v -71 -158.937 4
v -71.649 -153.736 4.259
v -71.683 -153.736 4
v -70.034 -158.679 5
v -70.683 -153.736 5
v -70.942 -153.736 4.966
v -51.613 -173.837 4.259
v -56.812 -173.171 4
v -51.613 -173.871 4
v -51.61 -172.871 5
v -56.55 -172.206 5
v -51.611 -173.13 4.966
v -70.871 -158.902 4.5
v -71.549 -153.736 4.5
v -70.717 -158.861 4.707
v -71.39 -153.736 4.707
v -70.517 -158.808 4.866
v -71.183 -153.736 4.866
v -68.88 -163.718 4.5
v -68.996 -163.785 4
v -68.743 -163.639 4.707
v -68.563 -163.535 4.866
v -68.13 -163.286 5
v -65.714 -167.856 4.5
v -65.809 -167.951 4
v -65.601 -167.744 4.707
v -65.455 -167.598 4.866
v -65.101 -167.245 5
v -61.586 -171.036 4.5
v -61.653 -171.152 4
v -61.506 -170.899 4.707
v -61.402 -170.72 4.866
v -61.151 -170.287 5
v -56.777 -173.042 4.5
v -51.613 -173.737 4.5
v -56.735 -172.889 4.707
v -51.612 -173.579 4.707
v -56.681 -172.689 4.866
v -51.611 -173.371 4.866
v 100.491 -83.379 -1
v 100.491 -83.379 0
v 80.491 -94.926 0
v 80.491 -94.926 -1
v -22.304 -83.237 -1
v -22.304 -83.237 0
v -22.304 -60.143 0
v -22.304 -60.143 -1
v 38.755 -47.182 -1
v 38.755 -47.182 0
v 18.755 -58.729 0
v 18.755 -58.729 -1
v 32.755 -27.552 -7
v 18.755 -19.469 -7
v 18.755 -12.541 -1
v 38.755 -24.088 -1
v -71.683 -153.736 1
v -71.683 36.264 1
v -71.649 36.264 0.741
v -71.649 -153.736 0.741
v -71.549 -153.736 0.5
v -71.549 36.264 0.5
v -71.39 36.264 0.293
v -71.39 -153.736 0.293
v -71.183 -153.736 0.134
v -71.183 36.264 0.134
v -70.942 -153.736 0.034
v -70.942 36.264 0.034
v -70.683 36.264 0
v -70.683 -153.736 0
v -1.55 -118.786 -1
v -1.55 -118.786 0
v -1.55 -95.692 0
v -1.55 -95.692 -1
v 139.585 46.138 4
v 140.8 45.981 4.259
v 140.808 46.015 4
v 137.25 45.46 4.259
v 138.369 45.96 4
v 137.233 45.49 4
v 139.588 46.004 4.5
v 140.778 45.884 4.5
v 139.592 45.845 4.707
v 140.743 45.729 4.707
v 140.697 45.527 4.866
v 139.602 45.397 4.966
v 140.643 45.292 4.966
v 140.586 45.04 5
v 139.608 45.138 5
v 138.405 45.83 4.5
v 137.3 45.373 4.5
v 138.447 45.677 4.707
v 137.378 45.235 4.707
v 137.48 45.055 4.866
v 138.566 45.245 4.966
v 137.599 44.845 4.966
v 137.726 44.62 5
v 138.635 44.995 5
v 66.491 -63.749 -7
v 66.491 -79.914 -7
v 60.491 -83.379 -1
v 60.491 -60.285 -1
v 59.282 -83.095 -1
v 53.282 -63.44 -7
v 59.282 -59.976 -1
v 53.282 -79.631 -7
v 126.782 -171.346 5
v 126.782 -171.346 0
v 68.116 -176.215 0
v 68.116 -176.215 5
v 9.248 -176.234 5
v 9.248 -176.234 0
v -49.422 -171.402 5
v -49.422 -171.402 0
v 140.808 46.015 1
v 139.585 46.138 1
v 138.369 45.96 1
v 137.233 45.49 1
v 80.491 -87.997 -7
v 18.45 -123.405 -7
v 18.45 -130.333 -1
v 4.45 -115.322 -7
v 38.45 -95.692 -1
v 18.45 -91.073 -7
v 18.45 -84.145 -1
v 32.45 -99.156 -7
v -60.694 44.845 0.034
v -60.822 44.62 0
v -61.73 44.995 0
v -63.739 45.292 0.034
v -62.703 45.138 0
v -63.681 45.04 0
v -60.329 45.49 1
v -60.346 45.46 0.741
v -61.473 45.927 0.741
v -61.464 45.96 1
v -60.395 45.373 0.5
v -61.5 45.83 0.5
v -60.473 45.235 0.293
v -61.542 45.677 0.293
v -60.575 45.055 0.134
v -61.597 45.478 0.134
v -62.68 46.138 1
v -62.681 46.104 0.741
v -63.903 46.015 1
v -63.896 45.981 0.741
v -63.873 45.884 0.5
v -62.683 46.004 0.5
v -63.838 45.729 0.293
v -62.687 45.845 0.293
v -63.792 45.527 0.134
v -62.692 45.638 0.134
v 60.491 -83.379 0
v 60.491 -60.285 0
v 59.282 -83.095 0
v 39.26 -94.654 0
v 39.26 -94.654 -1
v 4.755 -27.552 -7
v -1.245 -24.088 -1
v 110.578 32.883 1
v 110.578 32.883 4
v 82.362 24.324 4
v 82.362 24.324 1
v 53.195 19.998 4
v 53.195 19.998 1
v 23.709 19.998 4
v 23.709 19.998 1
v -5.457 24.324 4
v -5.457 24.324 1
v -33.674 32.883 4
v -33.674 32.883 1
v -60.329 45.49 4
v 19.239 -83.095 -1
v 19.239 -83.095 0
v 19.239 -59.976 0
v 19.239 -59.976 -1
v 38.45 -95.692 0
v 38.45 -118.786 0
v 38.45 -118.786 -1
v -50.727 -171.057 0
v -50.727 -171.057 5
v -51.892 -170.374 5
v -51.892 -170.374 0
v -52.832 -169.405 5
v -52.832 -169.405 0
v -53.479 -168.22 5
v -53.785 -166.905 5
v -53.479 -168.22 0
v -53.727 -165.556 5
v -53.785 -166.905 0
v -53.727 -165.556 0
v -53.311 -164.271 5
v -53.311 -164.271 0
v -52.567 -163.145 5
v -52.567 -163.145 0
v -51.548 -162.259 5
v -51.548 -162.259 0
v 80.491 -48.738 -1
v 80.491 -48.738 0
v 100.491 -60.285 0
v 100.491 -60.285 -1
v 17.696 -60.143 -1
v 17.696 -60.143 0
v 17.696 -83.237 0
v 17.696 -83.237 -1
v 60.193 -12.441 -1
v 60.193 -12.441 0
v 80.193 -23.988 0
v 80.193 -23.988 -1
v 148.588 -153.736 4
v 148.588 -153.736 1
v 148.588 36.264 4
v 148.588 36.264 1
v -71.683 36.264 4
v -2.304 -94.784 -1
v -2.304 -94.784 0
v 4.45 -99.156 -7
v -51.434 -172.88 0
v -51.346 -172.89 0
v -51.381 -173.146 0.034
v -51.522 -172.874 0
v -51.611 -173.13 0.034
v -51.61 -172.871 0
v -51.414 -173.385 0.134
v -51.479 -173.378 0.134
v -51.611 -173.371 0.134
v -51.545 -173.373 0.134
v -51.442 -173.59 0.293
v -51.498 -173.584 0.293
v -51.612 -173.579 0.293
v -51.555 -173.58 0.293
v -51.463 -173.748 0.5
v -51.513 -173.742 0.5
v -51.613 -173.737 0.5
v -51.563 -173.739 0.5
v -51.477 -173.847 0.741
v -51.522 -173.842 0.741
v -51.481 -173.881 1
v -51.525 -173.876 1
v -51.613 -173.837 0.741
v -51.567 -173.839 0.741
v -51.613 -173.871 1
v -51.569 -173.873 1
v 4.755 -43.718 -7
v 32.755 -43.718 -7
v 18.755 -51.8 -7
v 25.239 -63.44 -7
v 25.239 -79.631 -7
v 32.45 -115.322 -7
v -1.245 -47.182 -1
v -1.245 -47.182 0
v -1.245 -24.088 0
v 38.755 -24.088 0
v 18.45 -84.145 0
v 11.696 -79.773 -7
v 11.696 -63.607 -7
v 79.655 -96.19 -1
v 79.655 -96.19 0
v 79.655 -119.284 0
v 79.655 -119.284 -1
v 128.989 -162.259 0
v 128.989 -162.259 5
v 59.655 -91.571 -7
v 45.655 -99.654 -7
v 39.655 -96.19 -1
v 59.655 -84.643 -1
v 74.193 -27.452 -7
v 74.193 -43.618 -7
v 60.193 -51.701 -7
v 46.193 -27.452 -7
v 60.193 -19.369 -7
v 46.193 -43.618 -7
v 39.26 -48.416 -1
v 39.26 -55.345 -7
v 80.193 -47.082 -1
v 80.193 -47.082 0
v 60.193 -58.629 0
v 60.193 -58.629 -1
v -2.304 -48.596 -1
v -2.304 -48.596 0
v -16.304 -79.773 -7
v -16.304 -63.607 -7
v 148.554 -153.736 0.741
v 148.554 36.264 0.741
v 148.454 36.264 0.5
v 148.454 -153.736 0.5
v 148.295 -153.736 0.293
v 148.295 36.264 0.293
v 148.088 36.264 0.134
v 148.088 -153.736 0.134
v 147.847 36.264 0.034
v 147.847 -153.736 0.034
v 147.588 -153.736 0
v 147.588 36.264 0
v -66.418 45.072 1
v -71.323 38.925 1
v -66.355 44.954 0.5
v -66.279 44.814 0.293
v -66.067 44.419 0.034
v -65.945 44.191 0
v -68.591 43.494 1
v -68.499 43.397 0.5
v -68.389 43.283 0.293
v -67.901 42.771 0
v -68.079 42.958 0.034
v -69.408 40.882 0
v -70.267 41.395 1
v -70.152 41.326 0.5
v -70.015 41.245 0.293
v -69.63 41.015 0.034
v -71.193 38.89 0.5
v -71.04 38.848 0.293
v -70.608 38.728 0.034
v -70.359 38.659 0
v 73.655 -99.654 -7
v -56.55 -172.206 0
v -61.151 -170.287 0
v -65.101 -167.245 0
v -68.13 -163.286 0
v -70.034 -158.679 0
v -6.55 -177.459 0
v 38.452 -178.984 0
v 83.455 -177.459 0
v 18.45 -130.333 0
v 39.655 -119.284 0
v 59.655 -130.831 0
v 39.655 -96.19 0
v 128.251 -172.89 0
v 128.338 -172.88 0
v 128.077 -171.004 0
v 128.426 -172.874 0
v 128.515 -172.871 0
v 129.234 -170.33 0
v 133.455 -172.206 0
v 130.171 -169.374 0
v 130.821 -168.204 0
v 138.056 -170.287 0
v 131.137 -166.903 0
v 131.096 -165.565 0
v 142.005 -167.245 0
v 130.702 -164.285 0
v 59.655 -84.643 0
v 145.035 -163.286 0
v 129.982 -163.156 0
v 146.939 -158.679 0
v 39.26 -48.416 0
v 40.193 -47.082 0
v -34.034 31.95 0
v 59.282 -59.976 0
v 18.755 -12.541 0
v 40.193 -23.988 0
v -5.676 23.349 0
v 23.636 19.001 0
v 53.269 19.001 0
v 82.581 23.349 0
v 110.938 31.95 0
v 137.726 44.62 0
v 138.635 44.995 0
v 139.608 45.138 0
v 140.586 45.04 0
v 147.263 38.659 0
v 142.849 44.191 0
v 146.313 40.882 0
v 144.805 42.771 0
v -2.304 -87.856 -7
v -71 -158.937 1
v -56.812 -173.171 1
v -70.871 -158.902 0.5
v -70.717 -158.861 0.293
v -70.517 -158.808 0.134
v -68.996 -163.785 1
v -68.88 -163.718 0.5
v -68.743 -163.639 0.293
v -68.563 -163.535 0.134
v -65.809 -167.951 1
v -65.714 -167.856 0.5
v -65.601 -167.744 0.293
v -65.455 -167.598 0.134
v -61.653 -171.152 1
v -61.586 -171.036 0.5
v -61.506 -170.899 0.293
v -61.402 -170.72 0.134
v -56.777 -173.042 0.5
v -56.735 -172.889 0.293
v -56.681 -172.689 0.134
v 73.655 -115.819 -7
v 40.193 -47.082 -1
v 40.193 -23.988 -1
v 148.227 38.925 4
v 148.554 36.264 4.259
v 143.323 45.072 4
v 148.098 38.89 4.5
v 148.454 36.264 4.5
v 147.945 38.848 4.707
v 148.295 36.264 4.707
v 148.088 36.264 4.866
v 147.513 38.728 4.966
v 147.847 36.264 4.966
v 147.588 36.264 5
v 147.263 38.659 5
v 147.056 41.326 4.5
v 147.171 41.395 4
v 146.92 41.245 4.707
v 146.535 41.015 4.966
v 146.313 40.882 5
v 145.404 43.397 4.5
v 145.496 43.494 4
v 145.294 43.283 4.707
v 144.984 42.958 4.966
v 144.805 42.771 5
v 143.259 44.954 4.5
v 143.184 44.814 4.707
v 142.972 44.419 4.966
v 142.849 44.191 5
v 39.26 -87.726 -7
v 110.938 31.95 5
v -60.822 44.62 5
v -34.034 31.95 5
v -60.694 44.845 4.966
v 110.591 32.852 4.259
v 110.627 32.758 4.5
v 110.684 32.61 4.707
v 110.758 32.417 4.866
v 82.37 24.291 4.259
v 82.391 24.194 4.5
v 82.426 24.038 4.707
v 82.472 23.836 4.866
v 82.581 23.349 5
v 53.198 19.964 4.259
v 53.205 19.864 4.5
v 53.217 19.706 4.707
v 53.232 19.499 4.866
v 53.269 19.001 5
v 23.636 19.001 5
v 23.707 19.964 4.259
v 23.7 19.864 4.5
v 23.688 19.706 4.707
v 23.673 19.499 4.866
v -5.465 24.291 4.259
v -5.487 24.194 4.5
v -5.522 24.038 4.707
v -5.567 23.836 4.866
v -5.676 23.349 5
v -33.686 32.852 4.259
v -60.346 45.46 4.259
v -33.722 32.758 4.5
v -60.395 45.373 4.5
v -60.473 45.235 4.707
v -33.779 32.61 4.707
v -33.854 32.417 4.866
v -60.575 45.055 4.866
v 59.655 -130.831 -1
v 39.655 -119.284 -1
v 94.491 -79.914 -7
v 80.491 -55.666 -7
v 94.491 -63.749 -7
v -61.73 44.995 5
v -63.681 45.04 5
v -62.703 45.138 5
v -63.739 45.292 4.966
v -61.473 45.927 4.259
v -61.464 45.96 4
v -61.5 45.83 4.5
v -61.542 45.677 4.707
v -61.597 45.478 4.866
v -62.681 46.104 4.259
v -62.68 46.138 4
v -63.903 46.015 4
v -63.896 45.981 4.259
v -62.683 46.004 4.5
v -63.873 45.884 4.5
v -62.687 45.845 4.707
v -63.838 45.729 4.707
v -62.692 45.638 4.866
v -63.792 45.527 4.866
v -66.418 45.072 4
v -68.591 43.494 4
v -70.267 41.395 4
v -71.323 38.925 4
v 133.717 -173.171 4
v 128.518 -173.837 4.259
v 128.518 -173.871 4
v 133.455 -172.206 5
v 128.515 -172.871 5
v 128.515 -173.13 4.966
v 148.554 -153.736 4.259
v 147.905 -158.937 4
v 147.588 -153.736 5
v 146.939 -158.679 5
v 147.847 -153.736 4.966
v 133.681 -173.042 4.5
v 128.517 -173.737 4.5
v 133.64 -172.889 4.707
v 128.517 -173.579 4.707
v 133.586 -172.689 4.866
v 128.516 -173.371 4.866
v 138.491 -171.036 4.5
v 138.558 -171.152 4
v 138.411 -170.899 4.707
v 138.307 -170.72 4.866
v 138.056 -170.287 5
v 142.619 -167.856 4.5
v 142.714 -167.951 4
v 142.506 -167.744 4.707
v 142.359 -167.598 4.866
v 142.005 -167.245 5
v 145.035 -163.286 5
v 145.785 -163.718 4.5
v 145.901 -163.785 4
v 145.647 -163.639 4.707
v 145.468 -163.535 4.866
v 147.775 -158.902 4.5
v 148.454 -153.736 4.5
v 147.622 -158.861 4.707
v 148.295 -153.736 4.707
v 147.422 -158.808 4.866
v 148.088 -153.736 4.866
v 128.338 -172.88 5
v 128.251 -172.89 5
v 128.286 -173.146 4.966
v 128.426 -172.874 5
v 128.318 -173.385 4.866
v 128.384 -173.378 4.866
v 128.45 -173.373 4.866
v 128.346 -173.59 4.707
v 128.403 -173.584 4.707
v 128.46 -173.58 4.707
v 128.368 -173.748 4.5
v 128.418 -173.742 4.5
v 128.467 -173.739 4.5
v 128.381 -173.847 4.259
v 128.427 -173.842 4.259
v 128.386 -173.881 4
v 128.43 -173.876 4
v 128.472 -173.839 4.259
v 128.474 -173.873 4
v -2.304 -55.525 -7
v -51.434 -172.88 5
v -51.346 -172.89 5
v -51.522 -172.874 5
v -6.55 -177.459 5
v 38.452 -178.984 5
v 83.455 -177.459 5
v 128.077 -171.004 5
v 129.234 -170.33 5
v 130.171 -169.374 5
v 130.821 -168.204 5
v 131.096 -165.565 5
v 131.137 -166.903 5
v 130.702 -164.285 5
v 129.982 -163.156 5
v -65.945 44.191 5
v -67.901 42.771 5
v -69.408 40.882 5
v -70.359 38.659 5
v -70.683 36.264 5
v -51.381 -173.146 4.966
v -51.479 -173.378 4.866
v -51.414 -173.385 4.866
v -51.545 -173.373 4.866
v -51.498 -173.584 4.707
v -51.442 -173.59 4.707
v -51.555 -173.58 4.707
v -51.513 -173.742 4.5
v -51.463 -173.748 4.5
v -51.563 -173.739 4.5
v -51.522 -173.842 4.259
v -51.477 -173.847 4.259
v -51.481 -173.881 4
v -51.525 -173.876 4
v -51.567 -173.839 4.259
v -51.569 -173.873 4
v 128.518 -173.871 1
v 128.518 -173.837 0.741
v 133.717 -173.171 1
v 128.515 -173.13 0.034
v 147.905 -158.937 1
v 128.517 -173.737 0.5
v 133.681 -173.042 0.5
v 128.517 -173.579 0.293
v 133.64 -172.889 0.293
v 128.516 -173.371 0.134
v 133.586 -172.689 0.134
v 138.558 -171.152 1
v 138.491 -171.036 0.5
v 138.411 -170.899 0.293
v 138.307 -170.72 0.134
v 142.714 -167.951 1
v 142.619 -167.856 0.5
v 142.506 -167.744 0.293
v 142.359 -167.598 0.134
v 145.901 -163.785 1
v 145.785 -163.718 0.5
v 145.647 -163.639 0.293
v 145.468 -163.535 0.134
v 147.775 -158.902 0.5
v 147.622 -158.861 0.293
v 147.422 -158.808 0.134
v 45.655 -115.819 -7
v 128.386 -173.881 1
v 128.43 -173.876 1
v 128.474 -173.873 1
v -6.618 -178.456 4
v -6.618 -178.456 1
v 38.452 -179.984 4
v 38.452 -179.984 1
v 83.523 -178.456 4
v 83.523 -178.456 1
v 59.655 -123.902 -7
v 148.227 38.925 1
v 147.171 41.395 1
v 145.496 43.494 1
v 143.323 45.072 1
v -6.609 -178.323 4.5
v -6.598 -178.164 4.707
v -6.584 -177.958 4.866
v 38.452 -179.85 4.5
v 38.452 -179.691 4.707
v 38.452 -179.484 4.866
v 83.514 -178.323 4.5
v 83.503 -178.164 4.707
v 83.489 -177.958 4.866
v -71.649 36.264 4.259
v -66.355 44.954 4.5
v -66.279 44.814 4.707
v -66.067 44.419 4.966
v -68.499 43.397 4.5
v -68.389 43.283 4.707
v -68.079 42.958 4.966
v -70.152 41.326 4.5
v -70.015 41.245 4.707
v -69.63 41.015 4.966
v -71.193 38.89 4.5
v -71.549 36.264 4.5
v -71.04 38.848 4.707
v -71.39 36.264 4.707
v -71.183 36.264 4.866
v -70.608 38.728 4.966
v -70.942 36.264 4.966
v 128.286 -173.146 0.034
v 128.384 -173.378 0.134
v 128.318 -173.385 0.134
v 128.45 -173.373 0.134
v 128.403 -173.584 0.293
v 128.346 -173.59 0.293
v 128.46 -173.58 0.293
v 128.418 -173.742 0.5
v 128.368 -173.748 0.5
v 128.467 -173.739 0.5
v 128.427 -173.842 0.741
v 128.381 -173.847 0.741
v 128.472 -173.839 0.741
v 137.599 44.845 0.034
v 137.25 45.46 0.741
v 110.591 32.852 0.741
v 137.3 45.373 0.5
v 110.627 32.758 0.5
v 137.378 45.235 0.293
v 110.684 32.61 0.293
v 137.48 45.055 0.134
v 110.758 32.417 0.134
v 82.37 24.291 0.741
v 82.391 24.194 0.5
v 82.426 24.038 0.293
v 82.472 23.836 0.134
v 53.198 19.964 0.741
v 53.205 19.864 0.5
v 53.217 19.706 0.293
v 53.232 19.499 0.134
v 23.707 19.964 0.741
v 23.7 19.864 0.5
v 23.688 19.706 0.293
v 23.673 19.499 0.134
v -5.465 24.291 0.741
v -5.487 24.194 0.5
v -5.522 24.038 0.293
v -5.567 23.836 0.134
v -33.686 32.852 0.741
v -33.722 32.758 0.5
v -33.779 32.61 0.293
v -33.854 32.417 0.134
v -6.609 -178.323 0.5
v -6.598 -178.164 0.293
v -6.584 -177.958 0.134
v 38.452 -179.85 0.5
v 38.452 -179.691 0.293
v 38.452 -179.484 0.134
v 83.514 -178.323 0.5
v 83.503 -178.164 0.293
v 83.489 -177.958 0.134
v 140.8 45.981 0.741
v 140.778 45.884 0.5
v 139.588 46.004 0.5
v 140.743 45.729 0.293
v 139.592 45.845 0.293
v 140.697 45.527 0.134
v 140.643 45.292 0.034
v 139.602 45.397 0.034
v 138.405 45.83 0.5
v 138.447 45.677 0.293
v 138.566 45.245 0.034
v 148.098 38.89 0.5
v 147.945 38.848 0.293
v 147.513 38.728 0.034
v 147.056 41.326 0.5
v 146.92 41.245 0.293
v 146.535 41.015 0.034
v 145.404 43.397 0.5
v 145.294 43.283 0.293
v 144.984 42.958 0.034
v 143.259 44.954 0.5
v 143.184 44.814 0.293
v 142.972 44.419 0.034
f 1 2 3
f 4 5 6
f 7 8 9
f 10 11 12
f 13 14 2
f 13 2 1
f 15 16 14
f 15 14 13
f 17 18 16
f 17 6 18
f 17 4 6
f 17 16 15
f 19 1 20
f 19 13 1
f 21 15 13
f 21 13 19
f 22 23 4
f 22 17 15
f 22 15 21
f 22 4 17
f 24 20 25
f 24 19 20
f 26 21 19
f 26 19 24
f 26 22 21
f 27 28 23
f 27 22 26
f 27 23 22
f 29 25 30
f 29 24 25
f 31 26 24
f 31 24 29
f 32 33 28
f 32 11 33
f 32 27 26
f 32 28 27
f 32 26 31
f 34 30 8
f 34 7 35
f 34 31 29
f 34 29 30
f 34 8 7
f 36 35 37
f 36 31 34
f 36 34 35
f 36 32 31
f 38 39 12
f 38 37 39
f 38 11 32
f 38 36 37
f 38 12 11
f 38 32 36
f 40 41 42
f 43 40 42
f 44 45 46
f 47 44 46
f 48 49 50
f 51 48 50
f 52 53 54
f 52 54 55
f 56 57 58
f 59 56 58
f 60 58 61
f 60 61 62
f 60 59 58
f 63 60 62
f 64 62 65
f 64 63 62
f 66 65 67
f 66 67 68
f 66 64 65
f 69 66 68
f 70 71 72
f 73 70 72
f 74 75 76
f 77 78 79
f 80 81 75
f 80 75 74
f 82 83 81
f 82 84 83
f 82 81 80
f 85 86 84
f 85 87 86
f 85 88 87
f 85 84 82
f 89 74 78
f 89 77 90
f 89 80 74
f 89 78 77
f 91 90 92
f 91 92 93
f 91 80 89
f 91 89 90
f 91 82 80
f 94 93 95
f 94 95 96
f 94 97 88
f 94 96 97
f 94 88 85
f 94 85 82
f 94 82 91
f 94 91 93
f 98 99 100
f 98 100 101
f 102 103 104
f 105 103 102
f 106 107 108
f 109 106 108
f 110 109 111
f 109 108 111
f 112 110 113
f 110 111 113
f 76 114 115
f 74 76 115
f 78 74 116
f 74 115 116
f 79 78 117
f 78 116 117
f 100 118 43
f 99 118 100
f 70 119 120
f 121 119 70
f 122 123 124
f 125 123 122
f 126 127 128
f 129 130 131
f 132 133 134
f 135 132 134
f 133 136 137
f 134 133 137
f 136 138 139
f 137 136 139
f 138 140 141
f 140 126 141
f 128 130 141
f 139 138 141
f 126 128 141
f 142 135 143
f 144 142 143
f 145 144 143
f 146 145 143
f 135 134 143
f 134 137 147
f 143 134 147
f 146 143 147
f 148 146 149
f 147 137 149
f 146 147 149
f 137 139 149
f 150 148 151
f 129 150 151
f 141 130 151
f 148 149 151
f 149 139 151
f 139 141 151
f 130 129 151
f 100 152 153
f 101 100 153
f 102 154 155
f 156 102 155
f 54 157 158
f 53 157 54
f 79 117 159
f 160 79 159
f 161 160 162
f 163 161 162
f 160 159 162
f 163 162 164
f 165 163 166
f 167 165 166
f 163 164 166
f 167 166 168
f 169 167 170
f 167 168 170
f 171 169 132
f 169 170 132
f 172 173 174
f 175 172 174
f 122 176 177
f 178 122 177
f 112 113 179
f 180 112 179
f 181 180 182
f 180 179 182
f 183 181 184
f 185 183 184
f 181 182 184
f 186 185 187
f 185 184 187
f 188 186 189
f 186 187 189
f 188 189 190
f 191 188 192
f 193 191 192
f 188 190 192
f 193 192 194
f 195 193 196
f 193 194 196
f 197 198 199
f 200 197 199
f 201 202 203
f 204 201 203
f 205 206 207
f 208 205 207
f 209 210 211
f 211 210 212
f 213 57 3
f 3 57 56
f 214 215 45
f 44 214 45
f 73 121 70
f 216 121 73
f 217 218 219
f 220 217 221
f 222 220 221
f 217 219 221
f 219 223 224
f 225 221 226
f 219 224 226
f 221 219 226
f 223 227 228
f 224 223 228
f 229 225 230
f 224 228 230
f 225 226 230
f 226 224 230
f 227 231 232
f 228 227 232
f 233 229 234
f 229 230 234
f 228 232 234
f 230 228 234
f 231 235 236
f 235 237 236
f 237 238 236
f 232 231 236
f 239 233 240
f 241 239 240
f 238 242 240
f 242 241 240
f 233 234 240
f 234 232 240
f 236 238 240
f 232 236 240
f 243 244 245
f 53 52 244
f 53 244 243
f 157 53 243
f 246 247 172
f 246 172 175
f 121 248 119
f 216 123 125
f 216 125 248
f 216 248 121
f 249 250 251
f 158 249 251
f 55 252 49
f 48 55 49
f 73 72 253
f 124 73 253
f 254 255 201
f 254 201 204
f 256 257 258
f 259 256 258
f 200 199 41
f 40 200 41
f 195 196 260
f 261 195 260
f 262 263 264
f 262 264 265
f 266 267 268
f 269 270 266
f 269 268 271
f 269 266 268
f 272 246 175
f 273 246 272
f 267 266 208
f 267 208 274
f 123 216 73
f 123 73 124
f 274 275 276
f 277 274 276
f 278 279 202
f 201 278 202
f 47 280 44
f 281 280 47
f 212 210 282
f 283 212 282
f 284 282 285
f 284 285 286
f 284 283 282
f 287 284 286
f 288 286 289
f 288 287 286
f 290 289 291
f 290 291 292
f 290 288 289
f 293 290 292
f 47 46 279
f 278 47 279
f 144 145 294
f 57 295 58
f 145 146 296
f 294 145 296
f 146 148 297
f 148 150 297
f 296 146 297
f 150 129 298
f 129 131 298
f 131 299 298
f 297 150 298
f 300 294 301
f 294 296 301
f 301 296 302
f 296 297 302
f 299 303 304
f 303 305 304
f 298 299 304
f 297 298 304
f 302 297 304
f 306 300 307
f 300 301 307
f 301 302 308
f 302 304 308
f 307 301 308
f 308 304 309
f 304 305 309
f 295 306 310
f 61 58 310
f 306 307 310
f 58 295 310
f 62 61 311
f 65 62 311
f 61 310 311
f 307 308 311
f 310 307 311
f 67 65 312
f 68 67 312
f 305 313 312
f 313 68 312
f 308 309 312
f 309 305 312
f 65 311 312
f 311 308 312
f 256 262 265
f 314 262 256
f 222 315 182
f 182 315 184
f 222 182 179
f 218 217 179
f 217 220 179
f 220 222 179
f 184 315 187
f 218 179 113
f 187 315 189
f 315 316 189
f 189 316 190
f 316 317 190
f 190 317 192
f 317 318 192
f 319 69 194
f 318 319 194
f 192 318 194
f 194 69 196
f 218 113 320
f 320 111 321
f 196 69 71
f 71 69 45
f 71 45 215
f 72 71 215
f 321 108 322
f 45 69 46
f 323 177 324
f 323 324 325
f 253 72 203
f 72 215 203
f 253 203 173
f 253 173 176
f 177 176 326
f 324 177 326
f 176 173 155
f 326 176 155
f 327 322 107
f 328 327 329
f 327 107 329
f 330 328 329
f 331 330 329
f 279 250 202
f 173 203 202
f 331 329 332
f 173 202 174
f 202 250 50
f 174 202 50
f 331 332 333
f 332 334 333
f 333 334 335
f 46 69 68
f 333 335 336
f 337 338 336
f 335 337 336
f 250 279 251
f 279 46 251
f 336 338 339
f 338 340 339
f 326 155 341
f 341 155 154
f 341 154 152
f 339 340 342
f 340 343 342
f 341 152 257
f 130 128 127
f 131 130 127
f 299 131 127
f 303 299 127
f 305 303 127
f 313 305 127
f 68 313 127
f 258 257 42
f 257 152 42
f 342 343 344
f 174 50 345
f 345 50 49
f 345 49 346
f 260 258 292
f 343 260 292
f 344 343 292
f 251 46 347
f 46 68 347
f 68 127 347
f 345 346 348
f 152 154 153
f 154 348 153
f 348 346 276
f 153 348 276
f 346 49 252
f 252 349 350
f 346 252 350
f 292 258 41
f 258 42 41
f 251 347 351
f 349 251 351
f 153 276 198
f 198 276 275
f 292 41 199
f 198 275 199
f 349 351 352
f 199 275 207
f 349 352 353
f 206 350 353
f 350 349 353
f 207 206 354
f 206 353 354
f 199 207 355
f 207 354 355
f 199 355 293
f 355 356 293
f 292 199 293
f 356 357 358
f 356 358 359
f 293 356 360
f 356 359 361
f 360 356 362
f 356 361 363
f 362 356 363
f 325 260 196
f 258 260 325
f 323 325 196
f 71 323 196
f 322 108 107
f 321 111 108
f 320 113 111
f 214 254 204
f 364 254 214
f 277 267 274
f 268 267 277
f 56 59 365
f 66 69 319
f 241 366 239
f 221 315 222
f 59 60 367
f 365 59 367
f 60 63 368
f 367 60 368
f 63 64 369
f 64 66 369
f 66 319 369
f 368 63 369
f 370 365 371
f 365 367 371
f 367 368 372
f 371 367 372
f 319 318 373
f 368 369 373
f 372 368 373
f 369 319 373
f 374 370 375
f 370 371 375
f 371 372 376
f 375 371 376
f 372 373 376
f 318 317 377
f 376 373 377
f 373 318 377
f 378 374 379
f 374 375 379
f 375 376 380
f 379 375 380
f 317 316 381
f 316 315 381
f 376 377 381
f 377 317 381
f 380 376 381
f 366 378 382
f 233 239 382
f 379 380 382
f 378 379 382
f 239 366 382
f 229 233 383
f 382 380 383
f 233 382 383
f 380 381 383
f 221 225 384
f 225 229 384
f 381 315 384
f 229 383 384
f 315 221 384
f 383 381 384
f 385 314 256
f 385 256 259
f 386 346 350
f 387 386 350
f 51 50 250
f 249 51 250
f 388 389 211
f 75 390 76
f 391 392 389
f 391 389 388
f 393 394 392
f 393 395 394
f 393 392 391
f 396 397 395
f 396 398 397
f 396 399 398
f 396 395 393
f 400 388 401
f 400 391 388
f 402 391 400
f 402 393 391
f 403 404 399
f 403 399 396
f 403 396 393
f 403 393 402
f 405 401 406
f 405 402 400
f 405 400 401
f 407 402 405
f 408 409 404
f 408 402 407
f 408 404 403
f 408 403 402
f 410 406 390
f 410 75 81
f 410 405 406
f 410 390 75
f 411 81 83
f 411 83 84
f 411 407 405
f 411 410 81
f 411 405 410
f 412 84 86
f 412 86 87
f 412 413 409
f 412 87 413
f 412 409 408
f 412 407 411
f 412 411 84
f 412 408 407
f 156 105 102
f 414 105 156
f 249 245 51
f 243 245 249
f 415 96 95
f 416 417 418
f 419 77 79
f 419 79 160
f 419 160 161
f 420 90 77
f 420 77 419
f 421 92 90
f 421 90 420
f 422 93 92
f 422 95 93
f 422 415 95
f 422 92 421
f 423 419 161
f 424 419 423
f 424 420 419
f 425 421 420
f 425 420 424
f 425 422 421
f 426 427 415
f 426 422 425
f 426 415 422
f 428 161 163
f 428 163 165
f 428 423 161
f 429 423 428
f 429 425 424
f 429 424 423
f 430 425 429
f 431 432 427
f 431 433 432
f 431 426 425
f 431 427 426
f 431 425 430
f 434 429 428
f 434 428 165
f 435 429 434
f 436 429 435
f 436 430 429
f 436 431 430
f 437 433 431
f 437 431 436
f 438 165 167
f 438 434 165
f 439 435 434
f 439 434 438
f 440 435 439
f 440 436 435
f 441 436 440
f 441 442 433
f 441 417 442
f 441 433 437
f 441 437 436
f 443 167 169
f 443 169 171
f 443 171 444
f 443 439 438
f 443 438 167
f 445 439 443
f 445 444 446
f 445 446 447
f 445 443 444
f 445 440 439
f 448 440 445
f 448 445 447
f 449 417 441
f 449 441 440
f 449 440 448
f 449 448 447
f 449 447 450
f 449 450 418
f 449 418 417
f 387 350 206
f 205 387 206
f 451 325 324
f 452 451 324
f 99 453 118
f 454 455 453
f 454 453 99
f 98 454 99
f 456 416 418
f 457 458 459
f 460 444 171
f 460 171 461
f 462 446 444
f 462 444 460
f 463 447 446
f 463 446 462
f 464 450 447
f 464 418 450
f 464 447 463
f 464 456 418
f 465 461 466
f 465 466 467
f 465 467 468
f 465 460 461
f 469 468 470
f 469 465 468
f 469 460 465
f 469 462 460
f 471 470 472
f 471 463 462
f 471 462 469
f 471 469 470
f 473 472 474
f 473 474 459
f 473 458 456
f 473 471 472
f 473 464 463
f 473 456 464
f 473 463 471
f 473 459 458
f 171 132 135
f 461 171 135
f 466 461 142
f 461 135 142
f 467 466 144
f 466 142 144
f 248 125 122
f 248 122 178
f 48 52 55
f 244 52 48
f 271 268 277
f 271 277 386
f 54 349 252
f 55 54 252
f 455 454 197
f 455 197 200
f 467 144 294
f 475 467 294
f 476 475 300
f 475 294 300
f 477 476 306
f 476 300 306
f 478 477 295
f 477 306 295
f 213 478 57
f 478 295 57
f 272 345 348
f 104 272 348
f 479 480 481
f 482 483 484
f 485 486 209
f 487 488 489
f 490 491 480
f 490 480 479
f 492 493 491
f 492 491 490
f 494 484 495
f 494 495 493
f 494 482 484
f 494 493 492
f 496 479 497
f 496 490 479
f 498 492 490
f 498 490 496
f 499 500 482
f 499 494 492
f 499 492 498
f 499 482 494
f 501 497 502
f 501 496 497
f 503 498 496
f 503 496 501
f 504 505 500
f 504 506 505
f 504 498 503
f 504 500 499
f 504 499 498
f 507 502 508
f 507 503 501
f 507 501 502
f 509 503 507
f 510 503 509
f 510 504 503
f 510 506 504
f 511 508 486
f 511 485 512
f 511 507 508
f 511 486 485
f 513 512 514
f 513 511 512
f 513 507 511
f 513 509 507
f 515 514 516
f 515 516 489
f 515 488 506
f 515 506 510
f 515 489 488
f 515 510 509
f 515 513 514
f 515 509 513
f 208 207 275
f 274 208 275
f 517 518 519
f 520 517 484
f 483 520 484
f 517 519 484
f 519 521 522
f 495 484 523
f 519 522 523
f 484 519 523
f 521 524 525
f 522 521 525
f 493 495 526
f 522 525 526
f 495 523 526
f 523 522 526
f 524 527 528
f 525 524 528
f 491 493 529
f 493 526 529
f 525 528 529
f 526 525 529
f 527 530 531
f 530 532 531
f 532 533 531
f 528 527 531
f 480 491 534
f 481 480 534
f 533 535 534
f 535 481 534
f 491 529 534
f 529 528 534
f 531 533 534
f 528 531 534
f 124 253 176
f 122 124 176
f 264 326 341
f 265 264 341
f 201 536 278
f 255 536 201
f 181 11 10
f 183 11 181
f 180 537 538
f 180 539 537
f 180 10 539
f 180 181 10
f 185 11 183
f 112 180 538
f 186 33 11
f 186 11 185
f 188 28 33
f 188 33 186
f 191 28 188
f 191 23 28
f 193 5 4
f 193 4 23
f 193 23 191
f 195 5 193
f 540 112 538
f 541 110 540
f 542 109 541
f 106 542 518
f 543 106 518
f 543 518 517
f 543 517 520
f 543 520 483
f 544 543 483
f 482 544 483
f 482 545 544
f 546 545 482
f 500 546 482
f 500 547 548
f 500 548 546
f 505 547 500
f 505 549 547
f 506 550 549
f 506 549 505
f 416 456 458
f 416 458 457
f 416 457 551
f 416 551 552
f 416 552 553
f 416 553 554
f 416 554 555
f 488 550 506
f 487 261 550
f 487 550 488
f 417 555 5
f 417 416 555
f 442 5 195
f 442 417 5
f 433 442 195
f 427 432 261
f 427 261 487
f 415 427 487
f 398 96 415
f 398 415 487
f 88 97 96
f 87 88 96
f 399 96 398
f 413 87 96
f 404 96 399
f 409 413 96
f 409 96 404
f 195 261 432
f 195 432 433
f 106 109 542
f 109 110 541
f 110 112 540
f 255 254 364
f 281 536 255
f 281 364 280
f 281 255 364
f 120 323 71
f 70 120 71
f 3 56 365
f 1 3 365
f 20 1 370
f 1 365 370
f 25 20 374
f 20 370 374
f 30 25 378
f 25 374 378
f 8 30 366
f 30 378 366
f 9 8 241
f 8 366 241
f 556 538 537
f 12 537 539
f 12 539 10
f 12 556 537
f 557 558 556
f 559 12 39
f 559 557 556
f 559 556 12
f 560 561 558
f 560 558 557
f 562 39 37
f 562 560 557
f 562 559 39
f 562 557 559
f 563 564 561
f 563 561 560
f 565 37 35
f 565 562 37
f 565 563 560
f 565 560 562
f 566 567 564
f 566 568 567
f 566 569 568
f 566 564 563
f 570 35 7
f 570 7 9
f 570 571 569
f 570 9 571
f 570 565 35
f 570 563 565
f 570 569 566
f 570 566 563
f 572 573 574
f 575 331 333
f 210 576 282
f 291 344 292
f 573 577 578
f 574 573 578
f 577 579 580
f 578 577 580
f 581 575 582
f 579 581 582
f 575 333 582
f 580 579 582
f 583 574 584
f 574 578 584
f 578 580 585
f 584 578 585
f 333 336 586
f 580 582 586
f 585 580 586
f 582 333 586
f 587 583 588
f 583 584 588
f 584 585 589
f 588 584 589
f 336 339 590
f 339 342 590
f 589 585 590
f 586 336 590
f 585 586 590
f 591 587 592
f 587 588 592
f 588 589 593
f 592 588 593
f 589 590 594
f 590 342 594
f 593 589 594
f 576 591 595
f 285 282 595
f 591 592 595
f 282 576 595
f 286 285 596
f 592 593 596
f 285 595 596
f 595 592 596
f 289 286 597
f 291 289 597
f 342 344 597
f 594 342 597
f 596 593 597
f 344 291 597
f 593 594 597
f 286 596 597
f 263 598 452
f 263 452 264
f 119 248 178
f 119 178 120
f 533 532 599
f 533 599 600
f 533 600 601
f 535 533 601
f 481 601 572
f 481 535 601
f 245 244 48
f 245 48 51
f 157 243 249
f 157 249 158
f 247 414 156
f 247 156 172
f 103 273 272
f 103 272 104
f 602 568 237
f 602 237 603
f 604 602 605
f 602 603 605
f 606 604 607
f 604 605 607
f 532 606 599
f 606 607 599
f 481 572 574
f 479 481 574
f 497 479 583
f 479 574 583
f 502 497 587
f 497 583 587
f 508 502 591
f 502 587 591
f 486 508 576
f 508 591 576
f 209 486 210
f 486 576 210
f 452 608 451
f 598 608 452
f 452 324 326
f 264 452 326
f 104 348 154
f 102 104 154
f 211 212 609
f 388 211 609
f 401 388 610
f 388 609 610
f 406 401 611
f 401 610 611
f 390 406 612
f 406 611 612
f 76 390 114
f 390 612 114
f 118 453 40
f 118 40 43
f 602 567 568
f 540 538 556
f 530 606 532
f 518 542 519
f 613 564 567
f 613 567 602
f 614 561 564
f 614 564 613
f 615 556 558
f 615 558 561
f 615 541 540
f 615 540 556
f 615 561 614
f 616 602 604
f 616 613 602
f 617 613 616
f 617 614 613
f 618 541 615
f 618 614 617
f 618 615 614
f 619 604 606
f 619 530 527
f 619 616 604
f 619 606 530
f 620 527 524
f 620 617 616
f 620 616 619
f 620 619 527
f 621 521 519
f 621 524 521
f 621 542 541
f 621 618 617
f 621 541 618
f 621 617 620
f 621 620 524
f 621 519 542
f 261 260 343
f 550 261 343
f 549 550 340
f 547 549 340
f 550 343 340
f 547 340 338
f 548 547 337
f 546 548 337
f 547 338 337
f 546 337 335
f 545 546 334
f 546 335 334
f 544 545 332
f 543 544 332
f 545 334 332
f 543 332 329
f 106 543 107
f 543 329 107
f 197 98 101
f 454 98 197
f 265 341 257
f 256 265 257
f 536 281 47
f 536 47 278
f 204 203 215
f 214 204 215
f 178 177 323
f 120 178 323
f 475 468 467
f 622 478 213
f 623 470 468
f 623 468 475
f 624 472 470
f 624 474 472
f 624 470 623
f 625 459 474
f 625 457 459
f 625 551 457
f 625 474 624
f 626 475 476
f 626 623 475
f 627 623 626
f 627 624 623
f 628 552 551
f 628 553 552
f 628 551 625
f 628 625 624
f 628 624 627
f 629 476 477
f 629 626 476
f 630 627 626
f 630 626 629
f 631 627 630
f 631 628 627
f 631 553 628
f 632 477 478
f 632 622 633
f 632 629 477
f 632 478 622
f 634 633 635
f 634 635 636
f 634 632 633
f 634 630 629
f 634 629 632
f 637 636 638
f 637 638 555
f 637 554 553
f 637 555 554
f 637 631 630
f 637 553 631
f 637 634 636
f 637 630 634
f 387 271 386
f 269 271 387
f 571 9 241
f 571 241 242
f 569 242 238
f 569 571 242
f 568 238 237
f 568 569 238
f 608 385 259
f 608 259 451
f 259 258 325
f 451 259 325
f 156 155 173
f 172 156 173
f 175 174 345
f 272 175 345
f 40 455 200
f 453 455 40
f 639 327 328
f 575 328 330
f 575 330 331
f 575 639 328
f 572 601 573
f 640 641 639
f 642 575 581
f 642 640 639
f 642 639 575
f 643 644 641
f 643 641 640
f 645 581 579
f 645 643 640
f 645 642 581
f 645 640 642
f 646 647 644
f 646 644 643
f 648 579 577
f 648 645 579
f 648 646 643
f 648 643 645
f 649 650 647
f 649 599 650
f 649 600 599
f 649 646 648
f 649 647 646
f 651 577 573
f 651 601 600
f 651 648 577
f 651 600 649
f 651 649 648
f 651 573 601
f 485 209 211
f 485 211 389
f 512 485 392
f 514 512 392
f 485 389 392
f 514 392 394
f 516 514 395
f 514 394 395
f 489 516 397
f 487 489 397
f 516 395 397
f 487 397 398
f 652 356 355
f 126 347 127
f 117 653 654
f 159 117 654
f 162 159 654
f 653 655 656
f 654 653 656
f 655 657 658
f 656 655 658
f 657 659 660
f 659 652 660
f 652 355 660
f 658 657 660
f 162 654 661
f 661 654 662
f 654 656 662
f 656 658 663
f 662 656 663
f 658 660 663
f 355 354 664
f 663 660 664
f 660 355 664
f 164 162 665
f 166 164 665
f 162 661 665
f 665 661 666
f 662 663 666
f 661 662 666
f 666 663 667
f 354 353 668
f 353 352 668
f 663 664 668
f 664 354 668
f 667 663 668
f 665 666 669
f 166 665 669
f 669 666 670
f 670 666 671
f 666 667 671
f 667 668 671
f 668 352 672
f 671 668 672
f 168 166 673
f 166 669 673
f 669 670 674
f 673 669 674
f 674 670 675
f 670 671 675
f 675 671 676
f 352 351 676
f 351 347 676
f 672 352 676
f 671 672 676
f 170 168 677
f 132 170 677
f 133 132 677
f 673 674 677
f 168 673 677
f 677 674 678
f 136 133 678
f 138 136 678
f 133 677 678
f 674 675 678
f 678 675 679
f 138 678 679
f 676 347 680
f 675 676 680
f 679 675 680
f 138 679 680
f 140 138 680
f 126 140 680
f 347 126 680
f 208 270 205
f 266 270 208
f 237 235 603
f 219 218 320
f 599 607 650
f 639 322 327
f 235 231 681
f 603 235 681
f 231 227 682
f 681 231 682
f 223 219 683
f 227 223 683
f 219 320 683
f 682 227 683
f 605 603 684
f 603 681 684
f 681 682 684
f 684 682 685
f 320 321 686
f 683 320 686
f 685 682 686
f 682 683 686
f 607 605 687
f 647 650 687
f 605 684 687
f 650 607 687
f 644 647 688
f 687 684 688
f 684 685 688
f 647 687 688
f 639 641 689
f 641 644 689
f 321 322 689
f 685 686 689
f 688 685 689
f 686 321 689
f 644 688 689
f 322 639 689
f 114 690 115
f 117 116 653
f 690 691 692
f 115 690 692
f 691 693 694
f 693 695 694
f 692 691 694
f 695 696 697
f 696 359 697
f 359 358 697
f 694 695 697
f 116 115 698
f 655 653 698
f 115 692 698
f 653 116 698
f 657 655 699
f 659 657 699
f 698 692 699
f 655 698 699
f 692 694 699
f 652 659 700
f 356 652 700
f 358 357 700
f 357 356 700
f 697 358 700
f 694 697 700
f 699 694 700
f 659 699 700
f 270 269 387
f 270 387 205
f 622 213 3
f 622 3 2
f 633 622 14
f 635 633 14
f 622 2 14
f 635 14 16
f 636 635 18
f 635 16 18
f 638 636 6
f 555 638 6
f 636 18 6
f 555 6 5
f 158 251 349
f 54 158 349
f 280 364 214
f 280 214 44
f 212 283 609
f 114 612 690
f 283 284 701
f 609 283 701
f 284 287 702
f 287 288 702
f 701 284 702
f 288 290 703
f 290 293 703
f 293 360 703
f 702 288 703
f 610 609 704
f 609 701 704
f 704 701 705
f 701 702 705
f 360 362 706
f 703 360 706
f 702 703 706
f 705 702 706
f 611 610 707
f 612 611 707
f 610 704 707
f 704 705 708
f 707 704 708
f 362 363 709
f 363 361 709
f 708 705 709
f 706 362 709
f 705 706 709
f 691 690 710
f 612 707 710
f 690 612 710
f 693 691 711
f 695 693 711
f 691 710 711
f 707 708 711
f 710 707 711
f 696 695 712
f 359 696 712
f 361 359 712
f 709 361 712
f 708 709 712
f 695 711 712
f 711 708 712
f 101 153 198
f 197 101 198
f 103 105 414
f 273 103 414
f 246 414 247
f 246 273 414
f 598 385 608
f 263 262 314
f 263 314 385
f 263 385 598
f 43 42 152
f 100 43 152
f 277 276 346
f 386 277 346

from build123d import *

# Parameters (mm, degrees)
BOSS_EXTRUDE1_DEPTH  = 5
FILLET1_R            = 1
BOSS_EXTRUDE17_DEPTH = 7
CHAMFER1_SIZE        = 6
CHAMFER2_SIZE        = 6
CHAMFER3_SIZE        = 6


with BuildPart() as part:
    # Sketch2 → Boss-Extrude1 (new body)
    with BuildSketch(Plane.XY):
        with BuildLine():
            Line((-71.683238322, 36.264064839), (-71.683238322, -153.735935161))
            ThreePointArc((-71.683238322, -153.735935161), (-65.785654561, -167.973961861), (-51.547627861, -173.871545622))
            ThreePointArc((-51.547627861, -173.871545622), (38.452372139, -179.984063939), (128.452372139, -173.871545622))
            ThreePointArc((128.452372139, -173.871545622), (142.690398839, -167.973961861), (148.5879826, -153.735935161))
            Line((148.5879826, -153.735935161), (148.5879826, 36.264064839))
            ThreePointArc((148.5879826, 36.264064839), (146.404575746, 42.501121163), (140.807808283, 46.014571182))
            ThreePointArc((140.807808283, 46.014571182), (138.971586139, 46.086284232), (137.233469629, 45.489789872))
            ThreePointArc((137.233469629, 45.489789872), (38.452372139, 19.454880614), (-60.328725351, 45.489789872))
            ThreePointArc((-60.328725351, 45.489789872), (-62.066841861, 46.086284232), (-63.903064005, 46.014571182))
            ThreePointArc((-63.903064005, 46.014571182), (-69.499831468, 42.501121163), (-71.683238322, 36.264064839))
        make_face()
        with BuildLine():
            Line((-51.547627861, -162.258832658), (128.989007395, -162.258832658))
            ThreePointArc((128.989007395, -162.258832658), (131.022308029, -167.563941455), (126.782256855, -171.345535941))
            ThreePointArc((126.782256855, -171.345535941), (38.682041526, -176.831727196), (-49.421685934, -171.402229683))
            ThreePointArc((-49.421685934, -171.402229683), (-53.676249609, -167.572612121), (-51.547627861, -162.258832658))
        make_face(mode=Mode.SUBTRACT)
    extrude(amount=BOSS_EXTRUDE1_DEPTH)

    # Fillet1
    fillet1_edges = [part.edges().sort_by_distance(p)[0] for p in [
        (38.452372139, 19.454880614, 5),
        (38.452372139, -179.984063939, 0),
        (-65.785654561, -167.973961861, 0),
        (-71.683238322, -58.735935161, 0),
        (-69.499831468, 42.501121163, 0),
        (-62.066841861, 46.086284232, 0),
        (38.452372139, 19.454880614, 0),
        (138.971586139, 46.086284232, 0),
        (146.404575746, 42.501121163, 0),
        (-62.066841861, 46.086284232, 5),
        (-69.499831468, 42.501121163, 5),
        (128.452372139, -173.871545622, 2.5),
        (-51.547627861, -173.871545622, 2.5),
        (-71.683238322, -58.735935161, 5),
        (-65.785654561, -167.973961861, 5),
        (38.452372139, -179.984063939, 5),
        (142.690398839, -167.973961861, 5),
        (148.5879826, -58.735935161, 5),
        (146.404575746, 42.501121163, 5),
        (138.971586139, 46.086284232, 5),
        (148.5879826, -58.735935161, 0),
        (142.690398839, -167.973961861, 0),
    ]]
    fillet(fillet1_edges, radius=FILLET1_R)

    # Sketch3 → Boss-Extrude17 (add)
    with BuildSketch(Plane(origin=(0, 0, 0), x_dir=(-1, 0, 0), z_dir=(0, 0, -1))):
        Polygon((-60.193398692, -12.441134496), (-80.193398692, -23.98813988), (-80.193398692, -47.082150648), (-60.193398692, -58.629156031), (-40.193398692, -47.082150648), (-40.193398692, -23.98813988), align=None)
        Polygon((-39.260340262, -48.416474981), (-59.281974378, -59.975970827), (-59.281974378, -83.094962521), (-39.260340262, -94.654458367), (-19.238706146, -83.094962521), (-19.238706146, -59.975970827), align=None)
        Polygon((-59.655195417, -84.642570383), (-79.655195417, -96.189575767), (-79.655195417, -119.283586535), (-59.655195417, -130.830591919), (-39.655195417, -119.283586535), (-39.655195417, -96.189575767), align=None)
        Polygon((-18.449927197, -84.144928283), (-38.449927197, -95.691933667), (-38.449927197, -118.785944435), (-18.449927197, -130.332949819), (1.550072803, -118.785944435), (1.550072803, -95.691933667), align=None)
        Polygon((2.303708649, -48.596386935), (-17.696291351, -60.143392319), (-17.696291351, -83.237403087), (2.303708649, -94.78440847), (22.303708649, -83.237403087), (22.303708649, -60.143392319), align=None)
        Polygon((-80.491202658, -48.737511822), (-100.491202658, -60.284517205), (-100.491202658, -83.378527973), (-80.491202658, -94.925533357), (-60.491202658, -83.378527973), (-60.491202658, -60.284517205), align=None)
        Polygon((-18.755317237, -12.540627892), (-38.755317237, -24.087633275), (-38.755317237, -47.181644043), (-18.755317237, -58.728649427), (1.244682763, -47.181644043), (1.244682763, -24.087633275), align=None)
    extrude(amount=BOSS_EXTRUDE17_DEPTH)

    # Chamfer1
    chamfer1_edges = [part.edges().sort_by_distance(p)[0] for p in [
        (70.491202658, -54.511014514, -7),
        (90.491202658, -54.511014514, -7),
        (100.491202658, -71.831522589, -7),
        (90.491202658, -89.152030665, -7),
        (70.491202658, -89.152030665, -7),
        (60.491202658, -71.831522589, -7),
    ]]
    chamfer(chamfer1_edges, length=CHAMFER1_SIZE)

    # Chamfer2
    chamfer2_edges = [part.edges().sort_by_distance(p)[0] for p in [
        (-12.303708649, -54.369889627, -7),
        (7.696291351, -54.369889627, -7),
        (17.696291351, -71.690397703, -7),
        (7.696291351, -89.010905779, -7),
        (-12.303708649, -89.010905779, -7),
        (-22.303708649, -71.690397703, -7),
    ]]
    chamfer(chamfer2_edges, length=CHAMFER2_SIZE)

    # Chamfer3
    chamfer3_edges = [part.edges().sort_by_distance(p)[0] for p in [
        (50.193398692, -18.214637188, -7),
        (70.193398692, -18.214637188, -7),
        (80.193398692, -35.535145264, -7),
        (70.193398692, -52.855653339, -7),
        (50.193398692, -52.855653339, -7),
        (40.193398692, -35.535145264, -7),
        (29.249523204, -54.196222904, -7),
        (49.27115732, -54.196222904, -7),
        (59.281974378, -71.535466674, -7),
        (49.27115732, -88.874710444, -7),
        (29.249523204, -88.874710444, -7),
        (19.238706146, -71.535466674, -7),
        (49.655195417, -90.416073075, -7),
        (69.655195417, -90.416073075, -7),
        (79.655195417, -107.736581151, -7),
        (69.655195417, -125.057089227, -7),
        (49.655195417, -125.057089227, -7),
        (39.655195417, -107.736581151, -7),
        (8.449927197, -89.918430975, -7),
        (28.449927197, -89.918430975, -7),
        (38.449927197, -107.238939051, -7),
        (28.449927197, -124.559447127, -7),
        (8.449927197, -124.559447127, -7),
        (-1.550072803, -107.238939051, -7),
        (8.755317237, -18.314130583, -7),
        (28.755317237, -18.314130583, -7),
        (38.755317237, -35.634638659, -7),
        (28.755317237, -52.955146735, -7),
        (8.755317237, -52.955146735, -7),
        (-1.244682763, -35.634638659, -7),
    ]]
    chamfer(chamfer3_edges, length=CHAMFER3_SIZE)


solid = part.part
